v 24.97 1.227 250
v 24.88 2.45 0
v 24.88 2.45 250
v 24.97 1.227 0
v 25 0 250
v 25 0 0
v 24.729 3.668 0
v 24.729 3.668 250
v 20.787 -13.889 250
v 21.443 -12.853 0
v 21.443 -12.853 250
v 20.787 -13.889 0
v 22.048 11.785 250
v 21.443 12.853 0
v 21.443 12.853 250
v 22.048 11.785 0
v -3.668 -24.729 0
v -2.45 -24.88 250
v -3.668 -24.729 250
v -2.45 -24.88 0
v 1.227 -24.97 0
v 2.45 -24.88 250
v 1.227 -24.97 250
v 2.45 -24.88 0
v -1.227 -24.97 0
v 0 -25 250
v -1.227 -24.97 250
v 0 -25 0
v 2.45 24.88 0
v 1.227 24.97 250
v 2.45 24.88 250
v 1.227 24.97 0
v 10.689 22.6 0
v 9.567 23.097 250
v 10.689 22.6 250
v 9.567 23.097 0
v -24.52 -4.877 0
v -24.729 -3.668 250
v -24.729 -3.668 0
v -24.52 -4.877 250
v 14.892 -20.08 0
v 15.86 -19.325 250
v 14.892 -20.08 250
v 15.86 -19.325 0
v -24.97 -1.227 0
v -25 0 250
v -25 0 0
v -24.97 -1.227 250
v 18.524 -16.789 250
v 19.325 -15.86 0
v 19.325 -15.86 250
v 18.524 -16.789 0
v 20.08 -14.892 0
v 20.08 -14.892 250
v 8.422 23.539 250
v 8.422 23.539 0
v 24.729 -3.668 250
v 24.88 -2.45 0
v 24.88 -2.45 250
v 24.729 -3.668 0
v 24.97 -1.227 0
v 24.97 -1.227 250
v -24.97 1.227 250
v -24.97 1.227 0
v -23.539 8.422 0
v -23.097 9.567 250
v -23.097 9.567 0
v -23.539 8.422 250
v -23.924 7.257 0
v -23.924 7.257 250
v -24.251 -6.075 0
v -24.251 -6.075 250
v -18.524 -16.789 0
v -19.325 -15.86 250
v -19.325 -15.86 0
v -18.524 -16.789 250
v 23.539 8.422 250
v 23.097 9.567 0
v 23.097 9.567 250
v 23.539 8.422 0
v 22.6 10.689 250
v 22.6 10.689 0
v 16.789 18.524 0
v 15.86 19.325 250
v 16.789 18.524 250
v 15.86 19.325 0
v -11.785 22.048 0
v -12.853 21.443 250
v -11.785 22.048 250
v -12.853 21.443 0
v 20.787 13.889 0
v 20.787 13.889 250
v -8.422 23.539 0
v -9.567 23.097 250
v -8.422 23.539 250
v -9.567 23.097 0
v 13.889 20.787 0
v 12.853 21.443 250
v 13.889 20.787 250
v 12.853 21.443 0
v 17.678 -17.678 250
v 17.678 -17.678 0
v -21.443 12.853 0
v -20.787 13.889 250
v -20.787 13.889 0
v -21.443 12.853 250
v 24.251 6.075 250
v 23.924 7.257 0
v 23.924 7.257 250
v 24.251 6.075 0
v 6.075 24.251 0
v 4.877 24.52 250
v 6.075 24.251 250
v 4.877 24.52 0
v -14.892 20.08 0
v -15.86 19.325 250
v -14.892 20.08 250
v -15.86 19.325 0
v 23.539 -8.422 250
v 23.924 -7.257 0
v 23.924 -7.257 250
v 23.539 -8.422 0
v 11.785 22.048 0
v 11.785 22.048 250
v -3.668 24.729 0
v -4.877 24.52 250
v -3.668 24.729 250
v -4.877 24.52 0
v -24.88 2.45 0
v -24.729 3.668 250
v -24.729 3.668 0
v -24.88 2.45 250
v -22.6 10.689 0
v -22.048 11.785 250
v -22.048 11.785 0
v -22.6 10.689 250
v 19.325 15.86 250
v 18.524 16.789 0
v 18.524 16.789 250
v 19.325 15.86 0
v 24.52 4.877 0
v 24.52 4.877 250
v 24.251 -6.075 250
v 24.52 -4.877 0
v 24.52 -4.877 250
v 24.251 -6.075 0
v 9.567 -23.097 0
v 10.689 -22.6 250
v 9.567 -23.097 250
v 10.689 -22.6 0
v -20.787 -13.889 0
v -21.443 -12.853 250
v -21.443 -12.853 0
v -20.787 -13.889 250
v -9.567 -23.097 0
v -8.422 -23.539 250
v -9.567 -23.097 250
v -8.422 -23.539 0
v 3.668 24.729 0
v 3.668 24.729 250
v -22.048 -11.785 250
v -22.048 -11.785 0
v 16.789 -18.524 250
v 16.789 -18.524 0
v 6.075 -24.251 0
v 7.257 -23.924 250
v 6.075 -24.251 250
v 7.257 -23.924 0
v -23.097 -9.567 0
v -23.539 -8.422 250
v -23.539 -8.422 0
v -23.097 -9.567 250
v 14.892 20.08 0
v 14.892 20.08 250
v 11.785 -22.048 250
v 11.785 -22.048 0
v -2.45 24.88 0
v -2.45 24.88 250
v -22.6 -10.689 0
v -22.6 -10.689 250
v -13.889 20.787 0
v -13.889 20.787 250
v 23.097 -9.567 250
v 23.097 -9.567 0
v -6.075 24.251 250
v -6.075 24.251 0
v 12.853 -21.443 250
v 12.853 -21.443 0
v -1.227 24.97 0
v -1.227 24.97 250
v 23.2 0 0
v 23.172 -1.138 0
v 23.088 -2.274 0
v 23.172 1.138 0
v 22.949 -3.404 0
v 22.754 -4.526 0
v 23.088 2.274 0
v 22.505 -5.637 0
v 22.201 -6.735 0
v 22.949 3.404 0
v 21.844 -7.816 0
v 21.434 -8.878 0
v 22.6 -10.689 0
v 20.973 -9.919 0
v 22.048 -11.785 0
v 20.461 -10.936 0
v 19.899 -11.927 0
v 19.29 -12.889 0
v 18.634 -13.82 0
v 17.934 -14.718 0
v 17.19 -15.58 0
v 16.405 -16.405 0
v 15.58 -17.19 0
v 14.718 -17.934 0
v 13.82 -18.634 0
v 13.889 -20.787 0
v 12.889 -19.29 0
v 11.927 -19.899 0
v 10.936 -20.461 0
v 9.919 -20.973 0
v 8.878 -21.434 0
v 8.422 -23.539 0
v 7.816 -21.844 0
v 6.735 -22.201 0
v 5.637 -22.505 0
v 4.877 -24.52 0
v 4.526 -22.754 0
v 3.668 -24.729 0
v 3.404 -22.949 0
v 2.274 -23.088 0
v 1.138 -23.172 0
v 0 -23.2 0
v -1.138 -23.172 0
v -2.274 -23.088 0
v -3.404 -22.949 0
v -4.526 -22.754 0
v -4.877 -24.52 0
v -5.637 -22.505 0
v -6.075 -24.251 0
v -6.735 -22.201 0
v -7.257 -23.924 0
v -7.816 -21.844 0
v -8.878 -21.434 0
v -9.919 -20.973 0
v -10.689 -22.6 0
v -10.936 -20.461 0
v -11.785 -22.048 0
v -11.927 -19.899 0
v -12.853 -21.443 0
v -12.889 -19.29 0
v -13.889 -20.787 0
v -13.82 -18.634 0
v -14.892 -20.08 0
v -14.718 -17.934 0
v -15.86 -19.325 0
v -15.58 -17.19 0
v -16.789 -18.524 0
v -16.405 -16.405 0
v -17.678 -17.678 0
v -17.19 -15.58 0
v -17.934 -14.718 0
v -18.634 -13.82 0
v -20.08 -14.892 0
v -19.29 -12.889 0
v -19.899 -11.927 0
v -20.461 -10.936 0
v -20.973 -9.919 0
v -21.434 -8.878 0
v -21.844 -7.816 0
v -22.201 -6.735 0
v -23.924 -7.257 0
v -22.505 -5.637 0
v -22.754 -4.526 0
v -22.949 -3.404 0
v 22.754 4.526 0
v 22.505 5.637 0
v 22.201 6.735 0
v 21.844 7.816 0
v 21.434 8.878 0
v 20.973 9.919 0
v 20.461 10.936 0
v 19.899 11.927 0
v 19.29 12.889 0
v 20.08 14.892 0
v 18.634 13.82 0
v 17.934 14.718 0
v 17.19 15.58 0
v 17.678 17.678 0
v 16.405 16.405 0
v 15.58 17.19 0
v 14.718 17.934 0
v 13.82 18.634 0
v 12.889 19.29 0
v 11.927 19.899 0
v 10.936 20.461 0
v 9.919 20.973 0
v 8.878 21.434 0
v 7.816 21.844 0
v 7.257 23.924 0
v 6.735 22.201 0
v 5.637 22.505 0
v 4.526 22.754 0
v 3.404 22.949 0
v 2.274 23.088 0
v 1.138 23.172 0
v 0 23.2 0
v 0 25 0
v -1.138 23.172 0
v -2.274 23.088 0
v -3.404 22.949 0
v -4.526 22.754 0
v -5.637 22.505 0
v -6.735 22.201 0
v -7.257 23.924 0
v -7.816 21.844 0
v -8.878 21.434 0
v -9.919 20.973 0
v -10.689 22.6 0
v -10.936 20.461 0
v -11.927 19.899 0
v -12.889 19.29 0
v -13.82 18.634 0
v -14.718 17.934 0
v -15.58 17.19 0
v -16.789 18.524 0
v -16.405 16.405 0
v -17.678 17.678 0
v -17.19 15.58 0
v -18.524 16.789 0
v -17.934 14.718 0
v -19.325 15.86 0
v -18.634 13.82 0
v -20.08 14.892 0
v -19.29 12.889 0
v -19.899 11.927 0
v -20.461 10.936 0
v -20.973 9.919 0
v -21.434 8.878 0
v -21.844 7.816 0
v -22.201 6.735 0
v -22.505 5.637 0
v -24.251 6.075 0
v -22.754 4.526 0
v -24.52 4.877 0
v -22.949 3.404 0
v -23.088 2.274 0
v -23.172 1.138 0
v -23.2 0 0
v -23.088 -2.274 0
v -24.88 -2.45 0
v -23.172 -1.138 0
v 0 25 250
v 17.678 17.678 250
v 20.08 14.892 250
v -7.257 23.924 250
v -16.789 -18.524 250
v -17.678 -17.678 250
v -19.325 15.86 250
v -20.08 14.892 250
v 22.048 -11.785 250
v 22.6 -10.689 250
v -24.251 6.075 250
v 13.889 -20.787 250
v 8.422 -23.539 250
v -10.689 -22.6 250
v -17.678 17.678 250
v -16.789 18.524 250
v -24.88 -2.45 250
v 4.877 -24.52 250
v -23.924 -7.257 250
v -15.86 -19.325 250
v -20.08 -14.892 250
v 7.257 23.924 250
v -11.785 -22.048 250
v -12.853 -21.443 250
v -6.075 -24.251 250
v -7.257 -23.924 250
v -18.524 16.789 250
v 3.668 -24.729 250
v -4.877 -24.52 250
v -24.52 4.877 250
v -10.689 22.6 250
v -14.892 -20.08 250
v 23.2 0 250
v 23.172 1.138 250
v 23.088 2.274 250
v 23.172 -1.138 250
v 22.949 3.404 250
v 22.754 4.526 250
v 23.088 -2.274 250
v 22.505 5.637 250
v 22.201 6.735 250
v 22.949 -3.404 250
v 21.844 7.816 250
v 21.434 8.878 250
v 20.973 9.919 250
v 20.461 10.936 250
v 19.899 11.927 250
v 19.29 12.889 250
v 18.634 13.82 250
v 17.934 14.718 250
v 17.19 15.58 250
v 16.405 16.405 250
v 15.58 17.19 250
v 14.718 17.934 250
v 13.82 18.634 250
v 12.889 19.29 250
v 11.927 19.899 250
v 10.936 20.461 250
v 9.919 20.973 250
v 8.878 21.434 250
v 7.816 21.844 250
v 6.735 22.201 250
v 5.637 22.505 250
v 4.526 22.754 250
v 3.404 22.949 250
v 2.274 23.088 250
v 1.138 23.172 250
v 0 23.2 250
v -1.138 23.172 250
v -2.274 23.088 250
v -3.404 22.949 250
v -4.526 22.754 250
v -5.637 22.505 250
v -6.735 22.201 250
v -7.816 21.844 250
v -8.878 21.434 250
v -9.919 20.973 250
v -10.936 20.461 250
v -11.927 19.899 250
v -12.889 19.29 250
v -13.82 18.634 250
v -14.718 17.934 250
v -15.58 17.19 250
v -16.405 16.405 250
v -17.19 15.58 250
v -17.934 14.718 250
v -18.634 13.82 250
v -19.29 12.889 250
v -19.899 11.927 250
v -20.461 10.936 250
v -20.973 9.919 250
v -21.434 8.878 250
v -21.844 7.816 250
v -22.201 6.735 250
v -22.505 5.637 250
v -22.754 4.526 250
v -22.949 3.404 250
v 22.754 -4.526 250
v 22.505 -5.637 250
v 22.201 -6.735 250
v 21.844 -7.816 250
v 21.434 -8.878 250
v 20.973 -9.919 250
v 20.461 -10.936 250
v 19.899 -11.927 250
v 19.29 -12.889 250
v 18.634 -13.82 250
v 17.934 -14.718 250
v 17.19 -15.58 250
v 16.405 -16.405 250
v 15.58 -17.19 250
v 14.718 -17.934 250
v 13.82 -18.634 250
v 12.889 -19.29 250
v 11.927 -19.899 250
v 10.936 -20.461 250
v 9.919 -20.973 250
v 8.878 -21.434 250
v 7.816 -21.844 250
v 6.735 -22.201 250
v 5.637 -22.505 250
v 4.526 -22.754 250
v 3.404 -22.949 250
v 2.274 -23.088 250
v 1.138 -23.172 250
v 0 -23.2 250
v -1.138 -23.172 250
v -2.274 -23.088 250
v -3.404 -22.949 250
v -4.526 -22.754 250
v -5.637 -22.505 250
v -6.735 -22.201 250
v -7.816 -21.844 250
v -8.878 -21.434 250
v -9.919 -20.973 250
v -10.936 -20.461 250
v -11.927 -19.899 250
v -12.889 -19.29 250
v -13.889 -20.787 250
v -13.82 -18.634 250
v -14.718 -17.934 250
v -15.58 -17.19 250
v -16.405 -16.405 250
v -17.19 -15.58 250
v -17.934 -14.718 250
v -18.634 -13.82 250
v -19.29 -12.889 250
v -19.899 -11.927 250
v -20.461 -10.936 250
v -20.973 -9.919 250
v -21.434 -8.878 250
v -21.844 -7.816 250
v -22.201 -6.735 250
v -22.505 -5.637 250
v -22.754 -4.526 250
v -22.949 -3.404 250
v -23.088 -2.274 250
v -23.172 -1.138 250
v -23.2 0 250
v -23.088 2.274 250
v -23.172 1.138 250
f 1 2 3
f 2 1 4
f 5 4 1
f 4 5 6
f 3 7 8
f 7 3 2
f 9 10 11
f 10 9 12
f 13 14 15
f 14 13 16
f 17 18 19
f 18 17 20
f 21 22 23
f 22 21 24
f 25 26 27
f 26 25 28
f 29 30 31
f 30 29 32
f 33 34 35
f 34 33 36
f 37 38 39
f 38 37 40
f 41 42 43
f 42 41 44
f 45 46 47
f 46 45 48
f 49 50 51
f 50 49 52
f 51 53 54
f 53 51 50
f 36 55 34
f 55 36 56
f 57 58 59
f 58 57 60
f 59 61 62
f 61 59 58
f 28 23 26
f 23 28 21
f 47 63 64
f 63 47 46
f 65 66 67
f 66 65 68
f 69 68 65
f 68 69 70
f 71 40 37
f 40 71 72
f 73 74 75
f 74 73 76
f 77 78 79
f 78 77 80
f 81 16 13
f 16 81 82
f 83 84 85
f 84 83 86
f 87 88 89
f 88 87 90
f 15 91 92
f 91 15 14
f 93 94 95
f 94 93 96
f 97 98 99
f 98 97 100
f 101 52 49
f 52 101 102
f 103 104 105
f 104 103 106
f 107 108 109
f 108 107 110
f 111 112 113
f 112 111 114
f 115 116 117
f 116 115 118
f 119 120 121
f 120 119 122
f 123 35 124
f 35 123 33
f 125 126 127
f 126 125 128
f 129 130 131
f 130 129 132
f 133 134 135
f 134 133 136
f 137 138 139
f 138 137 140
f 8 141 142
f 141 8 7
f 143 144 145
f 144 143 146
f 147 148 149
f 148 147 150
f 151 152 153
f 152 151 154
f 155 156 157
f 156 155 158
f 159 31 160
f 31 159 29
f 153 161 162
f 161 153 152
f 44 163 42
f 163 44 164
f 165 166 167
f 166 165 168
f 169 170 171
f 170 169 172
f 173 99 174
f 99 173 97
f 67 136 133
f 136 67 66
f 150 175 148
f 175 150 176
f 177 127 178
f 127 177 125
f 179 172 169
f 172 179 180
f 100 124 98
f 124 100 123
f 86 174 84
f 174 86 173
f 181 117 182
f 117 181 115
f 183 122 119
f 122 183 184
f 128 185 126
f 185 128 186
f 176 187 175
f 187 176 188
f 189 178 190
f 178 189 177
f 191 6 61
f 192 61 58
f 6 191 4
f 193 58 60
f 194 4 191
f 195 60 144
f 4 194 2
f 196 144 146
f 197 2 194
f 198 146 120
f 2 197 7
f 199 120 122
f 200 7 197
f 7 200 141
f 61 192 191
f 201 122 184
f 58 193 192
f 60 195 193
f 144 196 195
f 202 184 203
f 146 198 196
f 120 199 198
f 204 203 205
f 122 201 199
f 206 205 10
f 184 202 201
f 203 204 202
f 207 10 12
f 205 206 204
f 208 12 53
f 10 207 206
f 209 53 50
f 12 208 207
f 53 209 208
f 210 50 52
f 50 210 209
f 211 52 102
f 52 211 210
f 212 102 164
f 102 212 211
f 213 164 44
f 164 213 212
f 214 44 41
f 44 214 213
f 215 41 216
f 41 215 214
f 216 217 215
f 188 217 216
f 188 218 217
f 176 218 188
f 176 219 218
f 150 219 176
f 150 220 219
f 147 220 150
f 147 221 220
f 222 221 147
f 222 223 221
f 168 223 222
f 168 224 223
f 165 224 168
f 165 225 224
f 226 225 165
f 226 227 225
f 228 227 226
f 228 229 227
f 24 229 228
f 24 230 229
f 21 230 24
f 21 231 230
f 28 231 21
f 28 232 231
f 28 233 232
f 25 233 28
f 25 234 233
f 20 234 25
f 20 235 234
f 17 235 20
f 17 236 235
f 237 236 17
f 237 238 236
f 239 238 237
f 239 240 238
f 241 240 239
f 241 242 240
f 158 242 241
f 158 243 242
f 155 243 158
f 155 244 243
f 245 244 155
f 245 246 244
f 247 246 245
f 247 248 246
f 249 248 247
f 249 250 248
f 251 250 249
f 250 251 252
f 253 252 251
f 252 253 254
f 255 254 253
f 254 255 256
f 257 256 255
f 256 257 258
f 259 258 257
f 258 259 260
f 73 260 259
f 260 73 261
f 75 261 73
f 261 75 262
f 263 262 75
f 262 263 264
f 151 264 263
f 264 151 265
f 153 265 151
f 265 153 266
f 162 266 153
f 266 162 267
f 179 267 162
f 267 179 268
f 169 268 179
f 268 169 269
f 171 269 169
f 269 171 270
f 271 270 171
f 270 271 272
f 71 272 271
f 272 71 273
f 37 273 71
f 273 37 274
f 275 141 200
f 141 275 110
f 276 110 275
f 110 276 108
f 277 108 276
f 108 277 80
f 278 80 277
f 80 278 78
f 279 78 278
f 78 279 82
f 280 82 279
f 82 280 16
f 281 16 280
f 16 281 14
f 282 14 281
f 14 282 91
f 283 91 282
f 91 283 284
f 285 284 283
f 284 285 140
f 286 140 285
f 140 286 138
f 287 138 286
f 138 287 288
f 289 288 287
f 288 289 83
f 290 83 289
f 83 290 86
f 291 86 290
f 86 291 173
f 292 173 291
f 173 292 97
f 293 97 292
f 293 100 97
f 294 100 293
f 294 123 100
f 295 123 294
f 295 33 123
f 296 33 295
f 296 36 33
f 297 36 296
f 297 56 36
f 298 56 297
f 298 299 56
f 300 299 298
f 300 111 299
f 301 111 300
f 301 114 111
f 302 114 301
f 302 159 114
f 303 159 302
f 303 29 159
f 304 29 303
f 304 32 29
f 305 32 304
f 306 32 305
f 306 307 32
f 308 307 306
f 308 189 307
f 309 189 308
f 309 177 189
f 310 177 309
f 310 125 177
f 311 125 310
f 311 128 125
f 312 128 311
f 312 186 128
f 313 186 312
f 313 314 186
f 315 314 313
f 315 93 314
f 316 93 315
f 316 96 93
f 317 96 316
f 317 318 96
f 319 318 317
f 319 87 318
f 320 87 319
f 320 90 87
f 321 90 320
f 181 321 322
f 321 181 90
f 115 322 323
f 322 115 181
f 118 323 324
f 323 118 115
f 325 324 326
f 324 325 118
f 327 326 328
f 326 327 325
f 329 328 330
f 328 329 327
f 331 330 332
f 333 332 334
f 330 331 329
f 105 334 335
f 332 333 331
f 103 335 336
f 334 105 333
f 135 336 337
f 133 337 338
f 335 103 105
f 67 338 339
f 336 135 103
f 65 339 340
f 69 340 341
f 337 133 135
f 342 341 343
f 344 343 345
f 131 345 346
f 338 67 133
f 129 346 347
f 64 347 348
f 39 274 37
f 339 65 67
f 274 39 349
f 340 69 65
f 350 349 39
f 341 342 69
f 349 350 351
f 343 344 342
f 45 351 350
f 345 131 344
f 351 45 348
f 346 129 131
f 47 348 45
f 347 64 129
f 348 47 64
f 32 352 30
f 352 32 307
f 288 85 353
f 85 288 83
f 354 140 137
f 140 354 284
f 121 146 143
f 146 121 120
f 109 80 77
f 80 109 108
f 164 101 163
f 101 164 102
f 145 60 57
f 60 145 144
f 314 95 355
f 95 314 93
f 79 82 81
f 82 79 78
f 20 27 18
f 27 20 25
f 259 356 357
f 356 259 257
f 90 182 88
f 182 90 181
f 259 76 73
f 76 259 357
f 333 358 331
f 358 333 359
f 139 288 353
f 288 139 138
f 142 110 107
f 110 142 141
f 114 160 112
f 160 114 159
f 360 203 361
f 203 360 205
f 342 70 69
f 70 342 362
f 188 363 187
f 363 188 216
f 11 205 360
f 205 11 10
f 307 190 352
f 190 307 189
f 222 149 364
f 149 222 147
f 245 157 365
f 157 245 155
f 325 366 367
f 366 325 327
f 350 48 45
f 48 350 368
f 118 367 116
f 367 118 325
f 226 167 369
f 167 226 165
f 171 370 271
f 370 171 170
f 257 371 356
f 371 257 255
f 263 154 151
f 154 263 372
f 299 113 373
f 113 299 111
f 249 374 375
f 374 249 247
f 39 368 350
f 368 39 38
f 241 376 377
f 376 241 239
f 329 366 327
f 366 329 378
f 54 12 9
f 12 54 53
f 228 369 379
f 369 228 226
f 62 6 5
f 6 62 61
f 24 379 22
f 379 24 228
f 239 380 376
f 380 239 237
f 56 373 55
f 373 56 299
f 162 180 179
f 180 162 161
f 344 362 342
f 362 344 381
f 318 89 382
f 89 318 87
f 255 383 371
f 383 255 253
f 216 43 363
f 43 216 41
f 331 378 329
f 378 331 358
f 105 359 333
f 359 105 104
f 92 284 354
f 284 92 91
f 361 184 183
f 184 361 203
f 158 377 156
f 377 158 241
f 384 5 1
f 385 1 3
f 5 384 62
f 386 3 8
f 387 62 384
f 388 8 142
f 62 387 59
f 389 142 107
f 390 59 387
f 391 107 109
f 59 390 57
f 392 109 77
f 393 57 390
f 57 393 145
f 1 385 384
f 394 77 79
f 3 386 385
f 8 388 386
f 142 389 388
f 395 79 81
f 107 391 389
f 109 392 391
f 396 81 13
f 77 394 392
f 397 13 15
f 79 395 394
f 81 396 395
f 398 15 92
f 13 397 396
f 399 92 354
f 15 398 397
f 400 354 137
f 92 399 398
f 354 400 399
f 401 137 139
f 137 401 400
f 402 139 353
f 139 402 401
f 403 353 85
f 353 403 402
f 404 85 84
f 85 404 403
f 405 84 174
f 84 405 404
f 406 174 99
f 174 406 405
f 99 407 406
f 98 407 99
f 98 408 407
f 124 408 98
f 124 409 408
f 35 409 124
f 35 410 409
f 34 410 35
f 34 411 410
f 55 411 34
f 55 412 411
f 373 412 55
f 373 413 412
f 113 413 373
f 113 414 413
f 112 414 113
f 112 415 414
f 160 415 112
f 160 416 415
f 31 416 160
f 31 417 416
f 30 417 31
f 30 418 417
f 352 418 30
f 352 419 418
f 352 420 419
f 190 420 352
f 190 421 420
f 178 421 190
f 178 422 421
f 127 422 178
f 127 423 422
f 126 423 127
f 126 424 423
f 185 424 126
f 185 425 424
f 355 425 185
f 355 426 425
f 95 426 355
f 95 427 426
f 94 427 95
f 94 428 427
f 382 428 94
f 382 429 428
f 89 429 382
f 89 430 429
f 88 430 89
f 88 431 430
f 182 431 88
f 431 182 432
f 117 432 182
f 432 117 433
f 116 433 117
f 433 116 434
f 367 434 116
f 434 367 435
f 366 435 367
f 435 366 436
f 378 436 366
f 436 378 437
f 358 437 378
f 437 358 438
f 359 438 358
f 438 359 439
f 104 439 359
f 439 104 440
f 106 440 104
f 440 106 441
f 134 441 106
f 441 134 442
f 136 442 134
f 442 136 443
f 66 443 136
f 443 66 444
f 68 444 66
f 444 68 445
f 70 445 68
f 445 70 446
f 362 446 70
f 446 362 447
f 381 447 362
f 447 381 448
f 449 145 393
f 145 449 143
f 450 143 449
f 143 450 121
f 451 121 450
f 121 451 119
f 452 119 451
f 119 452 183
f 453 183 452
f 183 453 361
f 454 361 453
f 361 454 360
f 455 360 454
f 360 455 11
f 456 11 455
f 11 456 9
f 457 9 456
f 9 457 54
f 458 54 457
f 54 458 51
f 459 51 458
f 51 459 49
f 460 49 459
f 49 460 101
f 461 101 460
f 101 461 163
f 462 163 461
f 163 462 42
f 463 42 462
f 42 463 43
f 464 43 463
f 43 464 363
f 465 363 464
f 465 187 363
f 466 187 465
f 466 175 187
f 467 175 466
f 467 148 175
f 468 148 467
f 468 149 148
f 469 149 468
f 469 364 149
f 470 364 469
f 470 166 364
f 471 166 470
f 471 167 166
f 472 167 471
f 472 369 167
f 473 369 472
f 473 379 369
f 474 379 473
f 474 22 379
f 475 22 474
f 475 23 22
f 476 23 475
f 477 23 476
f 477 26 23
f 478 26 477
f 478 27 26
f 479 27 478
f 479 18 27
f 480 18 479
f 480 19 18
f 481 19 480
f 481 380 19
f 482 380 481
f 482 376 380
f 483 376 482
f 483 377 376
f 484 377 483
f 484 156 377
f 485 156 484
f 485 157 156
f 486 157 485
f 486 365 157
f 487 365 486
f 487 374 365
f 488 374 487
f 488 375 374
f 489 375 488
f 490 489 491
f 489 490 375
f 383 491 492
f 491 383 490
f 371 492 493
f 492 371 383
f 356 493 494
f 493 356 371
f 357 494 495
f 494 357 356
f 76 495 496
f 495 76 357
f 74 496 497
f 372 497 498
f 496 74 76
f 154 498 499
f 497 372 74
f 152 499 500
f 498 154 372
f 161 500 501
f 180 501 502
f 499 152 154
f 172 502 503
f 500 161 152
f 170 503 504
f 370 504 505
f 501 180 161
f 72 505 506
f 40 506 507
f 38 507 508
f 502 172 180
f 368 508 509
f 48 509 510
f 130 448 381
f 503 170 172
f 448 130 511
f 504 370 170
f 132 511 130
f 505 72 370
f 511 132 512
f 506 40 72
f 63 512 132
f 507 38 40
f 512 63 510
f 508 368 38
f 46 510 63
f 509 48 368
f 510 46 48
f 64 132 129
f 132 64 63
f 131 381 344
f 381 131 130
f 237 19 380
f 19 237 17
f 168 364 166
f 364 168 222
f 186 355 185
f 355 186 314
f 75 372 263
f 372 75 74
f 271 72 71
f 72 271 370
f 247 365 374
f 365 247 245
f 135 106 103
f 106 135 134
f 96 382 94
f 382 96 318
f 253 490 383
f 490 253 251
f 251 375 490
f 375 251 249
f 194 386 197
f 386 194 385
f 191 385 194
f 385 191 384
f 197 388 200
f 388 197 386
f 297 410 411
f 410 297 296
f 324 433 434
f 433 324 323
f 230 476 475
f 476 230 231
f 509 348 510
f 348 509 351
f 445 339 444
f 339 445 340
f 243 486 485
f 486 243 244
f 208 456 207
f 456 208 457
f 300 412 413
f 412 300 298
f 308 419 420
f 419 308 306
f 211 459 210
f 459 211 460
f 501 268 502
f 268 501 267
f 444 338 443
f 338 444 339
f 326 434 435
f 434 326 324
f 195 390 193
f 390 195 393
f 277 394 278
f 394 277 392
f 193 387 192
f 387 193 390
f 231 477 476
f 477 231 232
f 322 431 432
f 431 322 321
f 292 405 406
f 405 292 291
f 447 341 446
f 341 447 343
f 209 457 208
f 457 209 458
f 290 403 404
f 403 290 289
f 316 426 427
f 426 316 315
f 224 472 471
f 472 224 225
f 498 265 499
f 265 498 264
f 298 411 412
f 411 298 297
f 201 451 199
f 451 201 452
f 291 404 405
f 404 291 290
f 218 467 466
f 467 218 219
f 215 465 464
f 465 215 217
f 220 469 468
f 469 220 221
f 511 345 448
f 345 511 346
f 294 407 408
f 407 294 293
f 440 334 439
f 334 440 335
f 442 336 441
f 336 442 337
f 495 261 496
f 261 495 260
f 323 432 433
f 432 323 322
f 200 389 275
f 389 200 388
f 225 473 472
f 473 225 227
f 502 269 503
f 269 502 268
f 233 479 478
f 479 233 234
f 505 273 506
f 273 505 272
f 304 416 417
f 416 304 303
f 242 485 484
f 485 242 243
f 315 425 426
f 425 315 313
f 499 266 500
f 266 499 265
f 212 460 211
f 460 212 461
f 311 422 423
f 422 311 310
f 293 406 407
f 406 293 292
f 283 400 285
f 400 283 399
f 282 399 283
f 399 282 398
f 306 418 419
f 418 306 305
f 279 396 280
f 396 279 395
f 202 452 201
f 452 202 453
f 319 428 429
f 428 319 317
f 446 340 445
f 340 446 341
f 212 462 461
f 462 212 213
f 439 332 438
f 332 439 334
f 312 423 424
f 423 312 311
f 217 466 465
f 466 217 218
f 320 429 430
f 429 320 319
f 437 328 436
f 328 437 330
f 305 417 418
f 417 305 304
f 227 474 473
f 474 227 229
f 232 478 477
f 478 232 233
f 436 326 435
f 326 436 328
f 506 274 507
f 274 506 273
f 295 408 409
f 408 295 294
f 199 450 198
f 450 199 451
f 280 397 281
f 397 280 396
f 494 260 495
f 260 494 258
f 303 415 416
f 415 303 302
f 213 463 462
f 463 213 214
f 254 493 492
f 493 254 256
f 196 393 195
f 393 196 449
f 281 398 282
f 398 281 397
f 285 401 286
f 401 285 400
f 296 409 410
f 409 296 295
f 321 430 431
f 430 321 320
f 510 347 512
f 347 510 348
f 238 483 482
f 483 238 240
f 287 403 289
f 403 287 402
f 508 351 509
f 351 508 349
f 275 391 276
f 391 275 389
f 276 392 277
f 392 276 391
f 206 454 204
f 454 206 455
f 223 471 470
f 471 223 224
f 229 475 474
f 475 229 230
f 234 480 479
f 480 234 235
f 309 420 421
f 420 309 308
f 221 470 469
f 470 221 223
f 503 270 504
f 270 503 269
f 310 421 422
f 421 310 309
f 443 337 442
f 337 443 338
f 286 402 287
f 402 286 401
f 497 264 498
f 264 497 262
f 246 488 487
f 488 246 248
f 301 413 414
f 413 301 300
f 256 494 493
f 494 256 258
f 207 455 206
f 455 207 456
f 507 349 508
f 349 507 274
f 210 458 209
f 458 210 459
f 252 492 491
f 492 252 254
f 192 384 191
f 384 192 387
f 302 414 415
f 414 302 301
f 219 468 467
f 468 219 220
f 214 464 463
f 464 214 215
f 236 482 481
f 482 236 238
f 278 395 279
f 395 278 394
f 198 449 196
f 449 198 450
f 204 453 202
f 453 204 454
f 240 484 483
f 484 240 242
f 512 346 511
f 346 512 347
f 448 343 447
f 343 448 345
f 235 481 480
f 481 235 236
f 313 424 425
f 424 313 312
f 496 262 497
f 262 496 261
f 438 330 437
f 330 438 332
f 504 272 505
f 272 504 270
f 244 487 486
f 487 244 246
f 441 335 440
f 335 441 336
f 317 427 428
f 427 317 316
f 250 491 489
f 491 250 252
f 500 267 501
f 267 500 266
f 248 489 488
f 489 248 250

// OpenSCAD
$fn = 128;

// HT 50 pipe (approx): DN 50, length 250 mm
// Typical HT dimensions (approx):
// Outer diameter: 50 mm
// Wall thickness: 1.8 mm  -> inner diameter: 46.4 mm
// Length: 250 mm

od = 50;
wall = 1.8;
id = od - 2*wall;
L = 250;

difference() {
  cylinder(h = L, d = od);
  translate([0,0,-0.5])
    cylinder(h = L + 1, d = id);
}
